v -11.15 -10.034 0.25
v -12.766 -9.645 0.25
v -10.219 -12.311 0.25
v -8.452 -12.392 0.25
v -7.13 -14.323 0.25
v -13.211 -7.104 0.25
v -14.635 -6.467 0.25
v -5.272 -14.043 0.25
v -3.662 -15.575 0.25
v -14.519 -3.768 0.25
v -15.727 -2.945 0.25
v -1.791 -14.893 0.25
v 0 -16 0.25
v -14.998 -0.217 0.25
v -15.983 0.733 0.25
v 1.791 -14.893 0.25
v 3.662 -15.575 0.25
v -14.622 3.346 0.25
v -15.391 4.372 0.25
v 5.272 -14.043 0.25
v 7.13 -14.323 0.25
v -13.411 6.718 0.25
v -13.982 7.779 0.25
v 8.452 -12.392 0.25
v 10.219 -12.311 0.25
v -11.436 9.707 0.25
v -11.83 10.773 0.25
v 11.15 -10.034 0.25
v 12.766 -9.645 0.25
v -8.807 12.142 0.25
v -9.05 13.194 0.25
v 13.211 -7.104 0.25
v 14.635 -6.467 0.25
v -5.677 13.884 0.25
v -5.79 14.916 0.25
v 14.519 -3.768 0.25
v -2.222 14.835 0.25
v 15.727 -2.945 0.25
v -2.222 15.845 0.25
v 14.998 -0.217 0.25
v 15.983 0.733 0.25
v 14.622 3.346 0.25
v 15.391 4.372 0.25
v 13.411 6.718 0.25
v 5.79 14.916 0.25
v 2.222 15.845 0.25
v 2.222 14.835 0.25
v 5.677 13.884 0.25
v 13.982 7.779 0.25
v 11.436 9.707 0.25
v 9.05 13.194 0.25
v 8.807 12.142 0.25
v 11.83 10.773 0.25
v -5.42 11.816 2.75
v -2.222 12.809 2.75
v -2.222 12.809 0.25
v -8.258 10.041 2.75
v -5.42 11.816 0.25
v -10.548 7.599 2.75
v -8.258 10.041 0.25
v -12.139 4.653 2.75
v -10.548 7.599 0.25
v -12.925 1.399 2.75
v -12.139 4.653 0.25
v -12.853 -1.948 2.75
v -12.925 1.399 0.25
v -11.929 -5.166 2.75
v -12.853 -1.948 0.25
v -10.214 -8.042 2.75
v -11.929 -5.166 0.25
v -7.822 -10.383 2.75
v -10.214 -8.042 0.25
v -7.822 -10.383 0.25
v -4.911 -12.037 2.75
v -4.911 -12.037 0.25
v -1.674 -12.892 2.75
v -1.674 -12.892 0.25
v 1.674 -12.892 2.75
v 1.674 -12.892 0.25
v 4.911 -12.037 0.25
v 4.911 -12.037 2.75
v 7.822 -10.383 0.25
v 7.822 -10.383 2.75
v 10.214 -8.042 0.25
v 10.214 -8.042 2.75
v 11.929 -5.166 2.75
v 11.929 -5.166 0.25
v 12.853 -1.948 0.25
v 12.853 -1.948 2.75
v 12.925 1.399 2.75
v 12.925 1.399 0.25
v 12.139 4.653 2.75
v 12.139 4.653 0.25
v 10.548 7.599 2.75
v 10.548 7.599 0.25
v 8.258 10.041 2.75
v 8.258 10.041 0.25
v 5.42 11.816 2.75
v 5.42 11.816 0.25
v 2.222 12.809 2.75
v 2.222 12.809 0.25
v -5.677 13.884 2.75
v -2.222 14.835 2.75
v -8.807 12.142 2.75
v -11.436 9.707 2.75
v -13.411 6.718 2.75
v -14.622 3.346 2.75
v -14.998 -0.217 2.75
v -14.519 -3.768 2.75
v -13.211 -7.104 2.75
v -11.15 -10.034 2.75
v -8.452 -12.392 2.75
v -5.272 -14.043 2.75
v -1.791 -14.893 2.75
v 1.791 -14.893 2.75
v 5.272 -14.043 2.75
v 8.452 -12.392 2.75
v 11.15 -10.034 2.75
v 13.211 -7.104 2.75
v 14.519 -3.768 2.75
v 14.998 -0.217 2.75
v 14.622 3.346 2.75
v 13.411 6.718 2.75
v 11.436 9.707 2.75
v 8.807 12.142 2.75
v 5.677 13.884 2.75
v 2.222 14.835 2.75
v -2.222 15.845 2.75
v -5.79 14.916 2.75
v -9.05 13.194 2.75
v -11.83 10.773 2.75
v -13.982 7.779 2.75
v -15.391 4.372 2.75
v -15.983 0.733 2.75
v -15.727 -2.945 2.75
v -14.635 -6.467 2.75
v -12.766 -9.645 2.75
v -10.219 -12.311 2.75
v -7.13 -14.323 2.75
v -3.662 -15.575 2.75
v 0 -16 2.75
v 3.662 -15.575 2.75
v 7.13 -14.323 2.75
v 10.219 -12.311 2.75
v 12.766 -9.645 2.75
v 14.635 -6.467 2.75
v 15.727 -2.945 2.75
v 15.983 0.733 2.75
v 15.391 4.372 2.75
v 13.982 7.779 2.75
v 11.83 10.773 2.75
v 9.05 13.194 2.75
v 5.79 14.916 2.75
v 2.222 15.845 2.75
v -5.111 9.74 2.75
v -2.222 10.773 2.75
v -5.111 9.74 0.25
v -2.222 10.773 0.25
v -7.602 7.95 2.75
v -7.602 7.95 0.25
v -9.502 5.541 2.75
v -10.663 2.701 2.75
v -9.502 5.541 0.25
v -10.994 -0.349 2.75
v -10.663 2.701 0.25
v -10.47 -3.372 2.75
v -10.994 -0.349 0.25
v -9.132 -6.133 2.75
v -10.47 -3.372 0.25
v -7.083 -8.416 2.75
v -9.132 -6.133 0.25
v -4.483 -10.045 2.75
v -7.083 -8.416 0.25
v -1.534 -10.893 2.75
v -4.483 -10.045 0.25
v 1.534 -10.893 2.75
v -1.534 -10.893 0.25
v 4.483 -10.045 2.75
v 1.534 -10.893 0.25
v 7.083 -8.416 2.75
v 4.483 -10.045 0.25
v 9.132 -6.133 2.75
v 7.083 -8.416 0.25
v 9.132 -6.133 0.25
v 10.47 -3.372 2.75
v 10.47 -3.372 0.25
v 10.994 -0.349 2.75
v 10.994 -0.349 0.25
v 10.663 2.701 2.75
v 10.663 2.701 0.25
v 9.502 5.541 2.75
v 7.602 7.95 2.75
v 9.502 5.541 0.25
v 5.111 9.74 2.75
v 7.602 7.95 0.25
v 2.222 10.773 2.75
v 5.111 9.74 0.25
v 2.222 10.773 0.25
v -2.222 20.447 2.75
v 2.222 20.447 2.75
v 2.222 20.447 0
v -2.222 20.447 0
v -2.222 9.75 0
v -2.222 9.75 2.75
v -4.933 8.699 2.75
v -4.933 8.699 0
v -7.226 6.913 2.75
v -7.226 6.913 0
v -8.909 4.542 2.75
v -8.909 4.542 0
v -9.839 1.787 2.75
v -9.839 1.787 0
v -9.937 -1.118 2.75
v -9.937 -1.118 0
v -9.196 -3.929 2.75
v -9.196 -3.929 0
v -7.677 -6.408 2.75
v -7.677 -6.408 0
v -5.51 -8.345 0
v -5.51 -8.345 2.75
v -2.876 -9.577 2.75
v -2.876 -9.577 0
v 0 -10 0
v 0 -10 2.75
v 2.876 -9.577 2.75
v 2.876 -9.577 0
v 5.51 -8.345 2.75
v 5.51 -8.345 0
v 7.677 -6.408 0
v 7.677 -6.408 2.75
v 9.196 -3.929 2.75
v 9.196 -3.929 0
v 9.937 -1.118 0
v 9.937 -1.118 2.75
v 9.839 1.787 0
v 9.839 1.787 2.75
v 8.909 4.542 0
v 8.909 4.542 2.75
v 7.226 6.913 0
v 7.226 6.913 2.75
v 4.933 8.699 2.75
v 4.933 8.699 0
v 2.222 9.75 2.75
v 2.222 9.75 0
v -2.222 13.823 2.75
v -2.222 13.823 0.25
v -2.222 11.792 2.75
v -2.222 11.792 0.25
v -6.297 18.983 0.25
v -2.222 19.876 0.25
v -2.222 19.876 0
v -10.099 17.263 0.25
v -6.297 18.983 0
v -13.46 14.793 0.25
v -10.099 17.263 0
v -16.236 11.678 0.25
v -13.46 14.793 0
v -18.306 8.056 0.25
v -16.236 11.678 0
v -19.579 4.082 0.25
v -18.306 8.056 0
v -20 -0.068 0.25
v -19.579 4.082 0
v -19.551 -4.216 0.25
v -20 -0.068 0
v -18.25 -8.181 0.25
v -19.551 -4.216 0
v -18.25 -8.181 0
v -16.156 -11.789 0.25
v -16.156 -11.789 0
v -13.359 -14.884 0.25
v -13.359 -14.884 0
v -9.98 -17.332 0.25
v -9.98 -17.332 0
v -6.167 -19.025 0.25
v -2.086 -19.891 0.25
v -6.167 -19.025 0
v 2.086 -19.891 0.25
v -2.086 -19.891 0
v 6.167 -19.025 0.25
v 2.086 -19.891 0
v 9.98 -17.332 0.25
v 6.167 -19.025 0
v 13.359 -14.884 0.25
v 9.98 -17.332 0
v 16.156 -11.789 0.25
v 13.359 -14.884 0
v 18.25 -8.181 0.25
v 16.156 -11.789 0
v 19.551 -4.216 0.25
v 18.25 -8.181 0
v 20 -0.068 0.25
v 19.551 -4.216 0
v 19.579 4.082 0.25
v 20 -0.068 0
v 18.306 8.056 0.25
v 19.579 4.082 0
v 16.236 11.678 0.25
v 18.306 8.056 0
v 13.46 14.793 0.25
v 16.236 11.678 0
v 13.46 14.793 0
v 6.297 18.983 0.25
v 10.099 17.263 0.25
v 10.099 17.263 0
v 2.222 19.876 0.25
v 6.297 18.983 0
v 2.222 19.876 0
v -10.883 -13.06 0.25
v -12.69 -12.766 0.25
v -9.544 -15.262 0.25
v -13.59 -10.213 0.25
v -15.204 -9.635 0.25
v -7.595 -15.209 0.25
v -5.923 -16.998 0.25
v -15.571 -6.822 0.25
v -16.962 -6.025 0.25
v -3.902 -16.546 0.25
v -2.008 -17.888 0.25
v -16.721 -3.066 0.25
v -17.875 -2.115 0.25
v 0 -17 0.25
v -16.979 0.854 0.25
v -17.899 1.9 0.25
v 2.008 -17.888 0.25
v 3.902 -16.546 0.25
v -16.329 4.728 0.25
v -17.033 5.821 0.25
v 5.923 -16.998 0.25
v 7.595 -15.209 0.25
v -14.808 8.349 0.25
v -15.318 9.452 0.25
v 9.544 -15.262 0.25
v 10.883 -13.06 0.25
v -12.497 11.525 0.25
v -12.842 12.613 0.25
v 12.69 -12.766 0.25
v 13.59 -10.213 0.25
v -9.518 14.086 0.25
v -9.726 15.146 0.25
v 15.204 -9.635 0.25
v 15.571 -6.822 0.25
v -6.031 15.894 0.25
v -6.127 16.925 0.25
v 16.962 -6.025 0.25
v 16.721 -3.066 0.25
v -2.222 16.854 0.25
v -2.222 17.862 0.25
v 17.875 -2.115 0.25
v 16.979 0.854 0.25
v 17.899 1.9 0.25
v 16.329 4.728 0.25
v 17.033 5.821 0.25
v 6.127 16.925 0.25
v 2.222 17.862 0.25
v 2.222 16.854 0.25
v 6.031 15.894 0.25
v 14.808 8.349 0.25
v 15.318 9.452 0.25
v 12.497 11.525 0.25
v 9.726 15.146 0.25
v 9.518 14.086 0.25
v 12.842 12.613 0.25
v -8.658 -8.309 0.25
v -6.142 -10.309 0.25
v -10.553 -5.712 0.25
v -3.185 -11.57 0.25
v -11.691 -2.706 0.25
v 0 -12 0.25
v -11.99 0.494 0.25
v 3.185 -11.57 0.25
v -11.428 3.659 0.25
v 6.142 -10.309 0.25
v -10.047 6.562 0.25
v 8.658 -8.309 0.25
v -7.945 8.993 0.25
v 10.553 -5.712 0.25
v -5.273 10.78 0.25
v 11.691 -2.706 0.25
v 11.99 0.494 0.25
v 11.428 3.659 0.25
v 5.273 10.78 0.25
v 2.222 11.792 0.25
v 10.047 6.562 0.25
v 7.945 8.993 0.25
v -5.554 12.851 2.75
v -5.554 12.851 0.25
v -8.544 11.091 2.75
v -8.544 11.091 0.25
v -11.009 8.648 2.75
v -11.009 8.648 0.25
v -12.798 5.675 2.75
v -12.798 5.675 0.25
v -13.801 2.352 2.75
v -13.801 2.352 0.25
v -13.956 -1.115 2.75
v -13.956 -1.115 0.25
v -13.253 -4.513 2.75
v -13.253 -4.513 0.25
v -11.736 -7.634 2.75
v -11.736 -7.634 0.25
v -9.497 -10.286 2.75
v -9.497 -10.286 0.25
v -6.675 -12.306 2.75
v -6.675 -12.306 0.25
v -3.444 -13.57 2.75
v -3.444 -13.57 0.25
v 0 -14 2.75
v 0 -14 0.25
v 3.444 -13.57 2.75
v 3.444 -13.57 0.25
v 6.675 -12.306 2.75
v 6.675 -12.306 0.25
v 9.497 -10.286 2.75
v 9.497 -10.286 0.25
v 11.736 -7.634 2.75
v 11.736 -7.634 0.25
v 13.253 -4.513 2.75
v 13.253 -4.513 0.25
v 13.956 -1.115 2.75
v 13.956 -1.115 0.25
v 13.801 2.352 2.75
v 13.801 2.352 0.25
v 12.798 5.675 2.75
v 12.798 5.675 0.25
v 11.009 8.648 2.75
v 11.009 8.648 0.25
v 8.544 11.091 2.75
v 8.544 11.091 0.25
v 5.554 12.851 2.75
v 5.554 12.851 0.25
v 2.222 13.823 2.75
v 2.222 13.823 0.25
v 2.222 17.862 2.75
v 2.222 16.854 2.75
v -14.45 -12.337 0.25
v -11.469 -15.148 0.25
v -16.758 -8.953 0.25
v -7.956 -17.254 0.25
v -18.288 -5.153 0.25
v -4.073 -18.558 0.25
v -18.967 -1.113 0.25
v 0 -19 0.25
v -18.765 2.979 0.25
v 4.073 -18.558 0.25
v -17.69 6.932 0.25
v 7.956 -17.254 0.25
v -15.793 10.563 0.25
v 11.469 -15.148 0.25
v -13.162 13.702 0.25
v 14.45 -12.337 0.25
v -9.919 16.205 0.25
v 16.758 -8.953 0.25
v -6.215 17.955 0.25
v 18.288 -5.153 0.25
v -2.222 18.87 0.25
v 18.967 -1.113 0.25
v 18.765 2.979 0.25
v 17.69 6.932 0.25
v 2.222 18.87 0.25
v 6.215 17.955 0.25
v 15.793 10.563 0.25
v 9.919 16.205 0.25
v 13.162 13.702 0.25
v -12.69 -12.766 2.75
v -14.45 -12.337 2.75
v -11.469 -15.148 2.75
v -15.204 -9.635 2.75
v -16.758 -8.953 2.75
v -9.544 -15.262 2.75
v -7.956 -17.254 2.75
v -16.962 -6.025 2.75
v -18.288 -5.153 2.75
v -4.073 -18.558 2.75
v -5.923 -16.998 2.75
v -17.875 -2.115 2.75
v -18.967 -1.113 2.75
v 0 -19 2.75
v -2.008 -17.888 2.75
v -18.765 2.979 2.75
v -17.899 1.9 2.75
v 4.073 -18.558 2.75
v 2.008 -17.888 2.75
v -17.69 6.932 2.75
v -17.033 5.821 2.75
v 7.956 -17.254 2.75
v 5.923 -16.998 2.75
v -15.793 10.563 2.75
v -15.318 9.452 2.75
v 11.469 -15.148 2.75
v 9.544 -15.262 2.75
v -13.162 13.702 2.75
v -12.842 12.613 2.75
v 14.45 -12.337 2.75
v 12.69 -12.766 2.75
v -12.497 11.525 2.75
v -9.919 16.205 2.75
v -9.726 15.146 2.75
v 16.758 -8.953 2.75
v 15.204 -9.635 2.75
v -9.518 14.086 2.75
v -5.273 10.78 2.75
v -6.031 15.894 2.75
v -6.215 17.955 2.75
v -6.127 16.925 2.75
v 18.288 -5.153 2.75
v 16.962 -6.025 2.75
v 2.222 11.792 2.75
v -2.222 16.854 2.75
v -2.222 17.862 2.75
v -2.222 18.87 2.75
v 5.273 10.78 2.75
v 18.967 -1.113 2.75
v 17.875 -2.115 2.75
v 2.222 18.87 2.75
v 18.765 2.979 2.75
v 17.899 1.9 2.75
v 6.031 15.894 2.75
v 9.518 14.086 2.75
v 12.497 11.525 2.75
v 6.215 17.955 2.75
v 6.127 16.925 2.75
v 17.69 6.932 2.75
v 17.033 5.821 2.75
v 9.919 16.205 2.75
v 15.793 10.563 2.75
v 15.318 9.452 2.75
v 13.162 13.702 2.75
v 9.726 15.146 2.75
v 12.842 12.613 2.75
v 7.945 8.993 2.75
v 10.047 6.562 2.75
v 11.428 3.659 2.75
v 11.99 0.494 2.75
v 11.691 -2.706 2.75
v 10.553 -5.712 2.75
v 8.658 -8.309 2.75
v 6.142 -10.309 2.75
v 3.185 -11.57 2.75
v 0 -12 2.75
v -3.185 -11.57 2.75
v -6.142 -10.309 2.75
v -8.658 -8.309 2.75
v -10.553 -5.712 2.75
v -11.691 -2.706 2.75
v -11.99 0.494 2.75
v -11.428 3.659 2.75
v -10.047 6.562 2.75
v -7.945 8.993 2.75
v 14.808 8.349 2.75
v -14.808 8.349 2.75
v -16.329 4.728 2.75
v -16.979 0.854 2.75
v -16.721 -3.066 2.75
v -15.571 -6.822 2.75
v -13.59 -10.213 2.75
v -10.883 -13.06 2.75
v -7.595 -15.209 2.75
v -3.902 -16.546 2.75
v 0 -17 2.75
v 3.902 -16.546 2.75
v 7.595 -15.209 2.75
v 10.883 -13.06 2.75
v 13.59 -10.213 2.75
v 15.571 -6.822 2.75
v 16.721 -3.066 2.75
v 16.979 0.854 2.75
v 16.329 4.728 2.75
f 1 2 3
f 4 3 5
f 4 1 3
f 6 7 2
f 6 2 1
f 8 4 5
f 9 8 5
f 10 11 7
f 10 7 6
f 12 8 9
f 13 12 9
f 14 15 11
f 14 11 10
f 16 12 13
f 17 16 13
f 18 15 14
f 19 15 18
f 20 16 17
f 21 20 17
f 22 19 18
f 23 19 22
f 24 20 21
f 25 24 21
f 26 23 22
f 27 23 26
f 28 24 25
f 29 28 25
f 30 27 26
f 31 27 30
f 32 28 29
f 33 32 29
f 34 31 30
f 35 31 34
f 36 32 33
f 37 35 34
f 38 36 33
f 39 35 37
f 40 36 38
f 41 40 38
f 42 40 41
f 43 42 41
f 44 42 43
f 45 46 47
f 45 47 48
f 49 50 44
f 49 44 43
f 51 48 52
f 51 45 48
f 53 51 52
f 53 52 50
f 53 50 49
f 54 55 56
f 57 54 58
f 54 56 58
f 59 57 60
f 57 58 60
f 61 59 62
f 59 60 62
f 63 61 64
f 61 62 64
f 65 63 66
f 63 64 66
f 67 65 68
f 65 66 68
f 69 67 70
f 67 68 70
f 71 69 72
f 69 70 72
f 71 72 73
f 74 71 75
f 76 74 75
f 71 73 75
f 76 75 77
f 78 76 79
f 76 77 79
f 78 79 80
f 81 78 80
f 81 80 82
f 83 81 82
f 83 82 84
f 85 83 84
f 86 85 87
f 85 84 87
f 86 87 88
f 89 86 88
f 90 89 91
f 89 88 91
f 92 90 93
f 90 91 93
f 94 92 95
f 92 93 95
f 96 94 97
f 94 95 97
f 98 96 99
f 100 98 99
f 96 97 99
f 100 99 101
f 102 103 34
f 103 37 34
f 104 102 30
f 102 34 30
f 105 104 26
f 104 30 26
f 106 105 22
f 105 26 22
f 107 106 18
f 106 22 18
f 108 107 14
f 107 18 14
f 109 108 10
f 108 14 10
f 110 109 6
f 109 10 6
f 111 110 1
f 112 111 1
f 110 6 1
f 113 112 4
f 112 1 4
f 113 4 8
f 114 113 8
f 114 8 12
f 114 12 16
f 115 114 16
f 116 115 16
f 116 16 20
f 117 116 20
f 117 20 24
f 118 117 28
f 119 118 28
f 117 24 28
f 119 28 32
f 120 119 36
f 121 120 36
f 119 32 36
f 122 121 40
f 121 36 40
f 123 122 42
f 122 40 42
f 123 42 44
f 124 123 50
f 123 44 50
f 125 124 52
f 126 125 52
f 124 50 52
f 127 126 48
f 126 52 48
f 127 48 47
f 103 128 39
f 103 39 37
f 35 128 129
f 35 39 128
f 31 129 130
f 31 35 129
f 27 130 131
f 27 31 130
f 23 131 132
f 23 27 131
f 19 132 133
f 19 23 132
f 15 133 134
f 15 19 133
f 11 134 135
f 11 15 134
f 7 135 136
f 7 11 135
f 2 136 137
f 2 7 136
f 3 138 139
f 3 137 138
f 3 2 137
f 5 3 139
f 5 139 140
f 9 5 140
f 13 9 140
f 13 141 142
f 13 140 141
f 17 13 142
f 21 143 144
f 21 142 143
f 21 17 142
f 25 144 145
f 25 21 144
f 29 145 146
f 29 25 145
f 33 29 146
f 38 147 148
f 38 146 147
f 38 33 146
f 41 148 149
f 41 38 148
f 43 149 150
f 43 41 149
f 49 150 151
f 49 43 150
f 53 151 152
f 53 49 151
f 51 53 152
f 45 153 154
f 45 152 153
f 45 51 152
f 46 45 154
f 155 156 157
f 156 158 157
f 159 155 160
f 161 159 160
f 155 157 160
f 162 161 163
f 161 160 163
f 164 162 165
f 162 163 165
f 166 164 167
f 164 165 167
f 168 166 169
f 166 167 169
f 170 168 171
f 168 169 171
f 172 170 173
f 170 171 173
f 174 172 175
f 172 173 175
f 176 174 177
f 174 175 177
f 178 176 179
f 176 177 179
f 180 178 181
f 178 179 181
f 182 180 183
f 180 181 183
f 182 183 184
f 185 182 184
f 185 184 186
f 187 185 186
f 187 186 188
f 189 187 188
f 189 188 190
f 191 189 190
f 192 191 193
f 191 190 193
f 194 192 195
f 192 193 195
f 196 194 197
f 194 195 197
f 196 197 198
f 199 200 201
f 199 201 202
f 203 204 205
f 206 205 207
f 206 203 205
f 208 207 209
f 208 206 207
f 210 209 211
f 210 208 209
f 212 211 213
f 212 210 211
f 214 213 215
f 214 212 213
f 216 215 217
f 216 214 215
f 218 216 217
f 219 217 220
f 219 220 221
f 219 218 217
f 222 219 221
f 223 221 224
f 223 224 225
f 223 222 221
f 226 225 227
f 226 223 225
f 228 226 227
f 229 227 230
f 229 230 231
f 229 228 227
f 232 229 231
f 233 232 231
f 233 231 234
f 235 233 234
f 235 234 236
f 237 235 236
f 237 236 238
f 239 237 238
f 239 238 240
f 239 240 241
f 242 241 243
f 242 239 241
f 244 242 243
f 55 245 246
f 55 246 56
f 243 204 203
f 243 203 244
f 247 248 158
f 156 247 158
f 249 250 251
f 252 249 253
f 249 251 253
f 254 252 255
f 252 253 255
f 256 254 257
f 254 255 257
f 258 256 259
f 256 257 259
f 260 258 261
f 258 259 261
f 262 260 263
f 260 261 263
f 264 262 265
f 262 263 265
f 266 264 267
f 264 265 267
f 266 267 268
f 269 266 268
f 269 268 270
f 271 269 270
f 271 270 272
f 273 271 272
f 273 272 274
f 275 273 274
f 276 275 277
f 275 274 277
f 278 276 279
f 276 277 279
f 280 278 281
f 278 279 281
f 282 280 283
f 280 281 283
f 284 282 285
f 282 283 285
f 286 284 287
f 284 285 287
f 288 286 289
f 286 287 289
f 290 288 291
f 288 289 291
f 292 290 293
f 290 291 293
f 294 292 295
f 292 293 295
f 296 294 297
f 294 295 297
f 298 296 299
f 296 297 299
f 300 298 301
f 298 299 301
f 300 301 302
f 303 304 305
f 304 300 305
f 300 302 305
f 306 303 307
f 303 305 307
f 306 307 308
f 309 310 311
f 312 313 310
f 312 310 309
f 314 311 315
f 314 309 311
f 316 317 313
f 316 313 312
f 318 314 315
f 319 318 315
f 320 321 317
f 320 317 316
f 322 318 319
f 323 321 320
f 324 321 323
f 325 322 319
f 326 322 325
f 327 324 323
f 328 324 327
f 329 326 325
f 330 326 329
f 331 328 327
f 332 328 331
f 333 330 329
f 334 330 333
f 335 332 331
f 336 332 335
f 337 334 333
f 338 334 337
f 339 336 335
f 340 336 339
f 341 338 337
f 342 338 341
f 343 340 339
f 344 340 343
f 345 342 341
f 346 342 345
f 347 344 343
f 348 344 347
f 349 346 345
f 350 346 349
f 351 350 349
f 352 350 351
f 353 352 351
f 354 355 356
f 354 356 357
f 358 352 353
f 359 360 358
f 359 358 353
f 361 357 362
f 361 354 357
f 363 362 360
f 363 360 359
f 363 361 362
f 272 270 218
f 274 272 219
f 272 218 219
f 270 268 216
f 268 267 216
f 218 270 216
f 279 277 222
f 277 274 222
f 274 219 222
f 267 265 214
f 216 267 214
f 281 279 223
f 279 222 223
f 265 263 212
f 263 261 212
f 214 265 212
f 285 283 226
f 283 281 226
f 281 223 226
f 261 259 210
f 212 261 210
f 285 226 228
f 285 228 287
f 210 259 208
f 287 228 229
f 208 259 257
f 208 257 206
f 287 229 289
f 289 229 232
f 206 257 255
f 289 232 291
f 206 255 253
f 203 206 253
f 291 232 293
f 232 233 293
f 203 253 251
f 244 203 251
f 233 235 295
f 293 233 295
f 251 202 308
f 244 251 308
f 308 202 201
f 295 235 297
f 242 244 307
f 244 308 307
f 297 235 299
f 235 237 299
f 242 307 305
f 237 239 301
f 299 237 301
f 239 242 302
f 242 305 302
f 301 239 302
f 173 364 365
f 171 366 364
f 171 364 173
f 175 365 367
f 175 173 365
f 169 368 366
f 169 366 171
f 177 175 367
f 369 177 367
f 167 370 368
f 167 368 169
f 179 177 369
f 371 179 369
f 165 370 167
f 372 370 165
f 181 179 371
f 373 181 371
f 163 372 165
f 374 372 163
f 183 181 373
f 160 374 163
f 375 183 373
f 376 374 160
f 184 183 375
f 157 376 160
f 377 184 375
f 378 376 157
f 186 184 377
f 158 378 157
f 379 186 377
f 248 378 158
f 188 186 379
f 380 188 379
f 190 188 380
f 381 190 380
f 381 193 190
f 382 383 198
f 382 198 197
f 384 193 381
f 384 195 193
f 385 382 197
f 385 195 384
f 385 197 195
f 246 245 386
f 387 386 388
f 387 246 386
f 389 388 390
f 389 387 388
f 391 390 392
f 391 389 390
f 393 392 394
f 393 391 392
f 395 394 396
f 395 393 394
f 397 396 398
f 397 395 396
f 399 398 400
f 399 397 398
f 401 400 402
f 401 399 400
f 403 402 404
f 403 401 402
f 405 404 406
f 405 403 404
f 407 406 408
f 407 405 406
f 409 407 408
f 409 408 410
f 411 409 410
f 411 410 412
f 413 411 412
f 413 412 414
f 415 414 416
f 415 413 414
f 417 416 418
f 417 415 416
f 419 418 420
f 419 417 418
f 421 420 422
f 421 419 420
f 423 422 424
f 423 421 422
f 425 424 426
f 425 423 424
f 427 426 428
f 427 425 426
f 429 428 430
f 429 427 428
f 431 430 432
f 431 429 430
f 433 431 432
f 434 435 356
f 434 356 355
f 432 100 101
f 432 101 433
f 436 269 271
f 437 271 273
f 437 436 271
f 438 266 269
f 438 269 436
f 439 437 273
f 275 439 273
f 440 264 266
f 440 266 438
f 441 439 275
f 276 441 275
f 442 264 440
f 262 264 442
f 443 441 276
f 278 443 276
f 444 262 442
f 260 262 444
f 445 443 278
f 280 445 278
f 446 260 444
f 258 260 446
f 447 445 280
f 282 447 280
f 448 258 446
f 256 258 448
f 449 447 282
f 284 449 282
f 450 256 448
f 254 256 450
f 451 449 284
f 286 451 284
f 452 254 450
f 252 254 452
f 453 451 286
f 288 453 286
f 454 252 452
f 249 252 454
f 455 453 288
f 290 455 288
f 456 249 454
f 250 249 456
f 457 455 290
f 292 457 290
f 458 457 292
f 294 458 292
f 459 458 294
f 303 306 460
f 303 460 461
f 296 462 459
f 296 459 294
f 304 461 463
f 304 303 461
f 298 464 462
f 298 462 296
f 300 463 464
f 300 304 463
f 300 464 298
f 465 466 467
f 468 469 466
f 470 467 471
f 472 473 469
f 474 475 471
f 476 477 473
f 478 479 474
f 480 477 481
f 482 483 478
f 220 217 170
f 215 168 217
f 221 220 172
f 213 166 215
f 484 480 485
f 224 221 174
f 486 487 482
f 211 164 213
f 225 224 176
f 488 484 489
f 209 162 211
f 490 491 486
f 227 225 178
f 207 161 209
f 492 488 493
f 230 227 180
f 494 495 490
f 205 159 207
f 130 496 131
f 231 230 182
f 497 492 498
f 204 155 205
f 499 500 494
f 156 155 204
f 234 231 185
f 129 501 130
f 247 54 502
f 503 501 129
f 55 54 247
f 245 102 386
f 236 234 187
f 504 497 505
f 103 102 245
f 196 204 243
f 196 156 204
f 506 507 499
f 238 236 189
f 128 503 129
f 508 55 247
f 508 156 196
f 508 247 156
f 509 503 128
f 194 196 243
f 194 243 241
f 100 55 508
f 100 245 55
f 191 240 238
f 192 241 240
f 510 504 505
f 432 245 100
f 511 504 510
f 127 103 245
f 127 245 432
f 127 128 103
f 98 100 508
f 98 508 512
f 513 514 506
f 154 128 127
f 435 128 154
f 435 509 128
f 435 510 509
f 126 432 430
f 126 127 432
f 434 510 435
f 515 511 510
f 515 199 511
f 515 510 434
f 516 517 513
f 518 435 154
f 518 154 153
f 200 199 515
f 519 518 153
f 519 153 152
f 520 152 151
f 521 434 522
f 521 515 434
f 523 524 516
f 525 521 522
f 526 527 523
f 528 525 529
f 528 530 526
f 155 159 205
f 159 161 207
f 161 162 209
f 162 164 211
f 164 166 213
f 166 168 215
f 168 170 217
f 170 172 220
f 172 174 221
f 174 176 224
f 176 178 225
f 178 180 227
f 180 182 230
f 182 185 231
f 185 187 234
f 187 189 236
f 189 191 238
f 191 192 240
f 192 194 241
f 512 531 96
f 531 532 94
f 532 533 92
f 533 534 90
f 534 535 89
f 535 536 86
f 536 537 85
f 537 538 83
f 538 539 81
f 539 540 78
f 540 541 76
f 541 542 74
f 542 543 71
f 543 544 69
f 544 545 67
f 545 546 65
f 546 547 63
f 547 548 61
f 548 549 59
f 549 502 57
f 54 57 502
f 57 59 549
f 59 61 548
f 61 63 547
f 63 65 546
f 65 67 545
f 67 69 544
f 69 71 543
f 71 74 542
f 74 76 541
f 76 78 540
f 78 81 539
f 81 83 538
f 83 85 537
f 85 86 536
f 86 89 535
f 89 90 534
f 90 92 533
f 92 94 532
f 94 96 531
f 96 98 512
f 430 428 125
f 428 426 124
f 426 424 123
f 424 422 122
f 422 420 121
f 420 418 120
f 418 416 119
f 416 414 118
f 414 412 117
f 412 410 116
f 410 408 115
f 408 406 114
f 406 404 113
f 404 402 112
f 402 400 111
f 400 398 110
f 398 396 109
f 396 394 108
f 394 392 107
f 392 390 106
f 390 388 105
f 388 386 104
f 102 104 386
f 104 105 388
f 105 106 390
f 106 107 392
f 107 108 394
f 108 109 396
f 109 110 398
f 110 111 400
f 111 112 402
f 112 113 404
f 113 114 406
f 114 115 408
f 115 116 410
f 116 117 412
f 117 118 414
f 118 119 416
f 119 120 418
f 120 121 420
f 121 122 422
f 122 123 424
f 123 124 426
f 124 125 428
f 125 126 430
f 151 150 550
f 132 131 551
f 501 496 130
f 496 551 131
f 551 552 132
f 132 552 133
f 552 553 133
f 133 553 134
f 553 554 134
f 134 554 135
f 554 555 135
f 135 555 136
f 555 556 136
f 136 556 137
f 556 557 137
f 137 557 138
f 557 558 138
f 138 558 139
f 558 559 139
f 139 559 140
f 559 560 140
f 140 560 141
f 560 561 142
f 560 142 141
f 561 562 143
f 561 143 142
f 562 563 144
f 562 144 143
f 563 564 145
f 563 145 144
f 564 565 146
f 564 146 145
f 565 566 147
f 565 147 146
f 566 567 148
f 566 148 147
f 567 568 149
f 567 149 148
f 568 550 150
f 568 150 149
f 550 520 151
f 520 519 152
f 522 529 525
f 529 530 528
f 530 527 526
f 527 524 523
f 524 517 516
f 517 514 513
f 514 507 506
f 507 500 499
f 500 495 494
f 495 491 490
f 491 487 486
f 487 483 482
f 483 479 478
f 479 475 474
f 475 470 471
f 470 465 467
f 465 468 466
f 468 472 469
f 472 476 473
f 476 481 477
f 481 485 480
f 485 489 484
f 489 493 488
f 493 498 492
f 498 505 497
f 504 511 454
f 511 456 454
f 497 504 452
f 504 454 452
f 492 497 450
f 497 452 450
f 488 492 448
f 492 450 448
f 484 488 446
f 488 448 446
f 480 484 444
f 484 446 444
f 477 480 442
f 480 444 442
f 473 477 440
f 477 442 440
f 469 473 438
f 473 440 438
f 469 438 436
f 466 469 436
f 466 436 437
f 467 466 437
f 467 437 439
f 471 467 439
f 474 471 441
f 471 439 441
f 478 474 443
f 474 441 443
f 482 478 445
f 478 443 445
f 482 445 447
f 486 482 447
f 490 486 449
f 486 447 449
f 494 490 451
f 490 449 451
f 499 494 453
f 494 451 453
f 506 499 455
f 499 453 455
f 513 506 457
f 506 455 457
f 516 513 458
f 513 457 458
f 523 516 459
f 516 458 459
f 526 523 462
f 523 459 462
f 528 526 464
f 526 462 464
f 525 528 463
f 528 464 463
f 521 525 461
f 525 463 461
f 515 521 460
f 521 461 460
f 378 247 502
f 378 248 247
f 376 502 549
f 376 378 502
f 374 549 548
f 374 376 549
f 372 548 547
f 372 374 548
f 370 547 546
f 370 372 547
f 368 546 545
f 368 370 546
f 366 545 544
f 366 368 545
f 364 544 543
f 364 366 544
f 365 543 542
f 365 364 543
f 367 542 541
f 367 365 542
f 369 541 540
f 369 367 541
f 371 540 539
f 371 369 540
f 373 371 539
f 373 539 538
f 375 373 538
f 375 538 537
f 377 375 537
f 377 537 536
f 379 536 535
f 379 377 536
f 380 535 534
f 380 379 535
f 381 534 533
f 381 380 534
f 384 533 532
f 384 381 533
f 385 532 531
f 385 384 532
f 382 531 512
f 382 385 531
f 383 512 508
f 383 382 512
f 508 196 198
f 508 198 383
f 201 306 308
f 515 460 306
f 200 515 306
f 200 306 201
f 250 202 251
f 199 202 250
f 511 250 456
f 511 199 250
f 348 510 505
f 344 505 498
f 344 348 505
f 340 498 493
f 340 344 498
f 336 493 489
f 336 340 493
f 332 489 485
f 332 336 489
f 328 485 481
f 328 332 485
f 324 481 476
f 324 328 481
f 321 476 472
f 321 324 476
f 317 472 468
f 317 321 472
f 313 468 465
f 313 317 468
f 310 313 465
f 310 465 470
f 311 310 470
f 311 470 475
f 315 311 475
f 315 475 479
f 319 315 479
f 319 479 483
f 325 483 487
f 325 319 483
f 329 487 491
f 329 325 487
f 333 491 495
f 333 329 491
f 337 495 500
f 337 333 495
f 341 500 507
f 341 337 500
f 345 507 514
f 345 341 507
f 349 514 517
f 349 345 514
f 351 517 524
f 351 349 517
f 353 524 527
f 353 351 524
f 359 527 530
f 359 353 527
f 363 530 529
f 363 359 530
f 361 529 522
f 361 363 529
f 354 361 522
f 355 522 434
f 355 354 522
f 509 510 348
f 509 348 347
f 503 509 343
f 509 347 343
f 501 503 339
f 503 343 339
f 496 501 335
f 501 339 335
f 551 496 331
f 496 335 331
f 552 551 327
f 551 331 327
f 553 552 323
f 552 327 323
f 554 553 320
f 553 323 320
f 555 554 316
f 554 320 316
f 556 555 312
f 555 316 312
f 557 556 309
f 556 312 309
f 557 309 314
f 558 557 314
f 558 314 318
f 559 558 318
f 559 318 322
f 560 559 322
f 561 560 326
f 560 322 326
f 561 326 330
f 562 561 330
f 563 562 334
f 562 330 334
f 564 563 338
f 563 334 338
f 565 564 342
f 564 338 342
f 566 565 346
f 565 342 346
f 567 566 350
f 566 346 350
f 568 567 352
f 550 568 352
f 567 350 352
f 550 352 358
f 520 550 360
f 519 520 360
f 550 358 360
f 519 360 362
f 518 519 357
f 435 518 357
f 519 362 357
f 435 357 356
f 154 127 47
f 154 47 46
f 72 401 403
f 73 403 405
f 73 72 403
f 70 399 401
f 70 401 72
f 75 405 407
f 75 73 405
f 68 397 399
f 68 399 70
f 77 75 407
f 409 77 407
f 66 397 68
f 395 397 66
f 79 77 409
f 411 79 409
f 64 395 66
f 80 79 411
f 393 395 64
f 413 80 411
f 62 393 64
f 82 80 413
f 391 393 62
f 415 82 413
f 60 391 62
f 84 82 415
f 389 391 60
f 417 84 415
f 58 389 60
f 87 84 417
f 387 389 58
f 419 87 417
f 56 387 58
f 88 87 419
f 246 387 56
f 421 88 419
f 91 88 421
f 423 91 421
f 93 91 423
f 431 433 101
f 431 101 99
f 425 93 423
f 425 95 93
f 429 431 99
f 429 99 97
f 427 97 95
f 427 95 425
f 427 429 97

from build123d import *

# Parameters (mm, degrees)
CROQUIS1_R              = 20
CROQUIS1_R_2            = 10
SALIENTE_EXTRUIR1_DEPTH = 2.75
CORTAR_EXTRUIR1_START   = -2.5
CROQUIS2_R              = 20
CROQUIS2_R_2            = 19
CROQUIS2_R_3            = 18
CROQUIS2_R_4            = 17
CROQUIS2_R_5            = 16
CROQUIS2_R_6            = 15
CROQUIS2_R_7            = 14
CROQUIS2_R_8            = 13
CROQUIS2_R_9            = 12
CROQUIS2_R_10           = 11
CORTAR_EXTRUIR1_DEPTH   = 2.5
SALIENTE_EXTRUIR2_DEPTH = 2.75


with BuildPart() as part:
    # Croquis1 → Saliente-Extruir1 (new body)
    with BuildSketch(Plane.XY):
        Circle(CROQUIS1_R)
        Circle(CROQUIS1_R_2, mode=Mode.SUBTRACT)
    extrude(amount=SALIENTE_EXTRUIR1_DEPTH)

    # Croquis2 → Cortar-Extruir1 (cut)
    # profile 1 of 5: a face of its own
    with BuildSketch(Plane.XY.offset(2.75).offset(CORTAR_EXTRUIR1_START)):
        Circle(CROQUIS2_R)
        Circle(CROQUIS2_R_2, mode=Mode.SUBTRACT)
    # profile 2 of 5: a face of its own
    with BuildSketch(Plane.XY.offset(2.75).offset(CORTAR_EXTRUIR1_START)):
        Circle(CROQUIS2_R_3)
        Circle(CROQUIS2_R_4, mode=Mode.SUBTRACT)
    # profile 3 of 5: a face of its own
    with BuildSketch(Plane.XY.offset(2.75).offset(CORTAR_EXTRUIR1_START)):
        Circle(CROQUIS2_R_5)
        Circle(CROQUIS2_R_6, mode=Mode.SUBTRACT)
    # profile 4 of 5: a face of its own
    with BuildSketch(Plane.XY.offset(2.75).offset(CORTAR_EXTRUIR1_START)):
        Circle(CROQUIS2_R_7)
        Circle(CROQUIS2_R_8, mode=Mode.SUBTRACT)
    # profile 5 of 5: a face of its own
    with BuildSketch(Plane.XY.offset(2.75).offset(CORTAR_EXTRUIR1_START)):
        Circle(CROQUIS2_R_9)
        Circle(CROQUIS2_R_10, mode=Mode.SUBTRACT)
    extrude(amount=CORTAR_EXTRUIR1_DEPTH, mode=Mode.SUBTRACT)

    # Croquis3 → Saliente-Extruir2 (add)
    with BuildSketch(Plane.XY.offset(2.75)):
        Polygon((-2.222048604, 9.75), (0, 9.75), (2.222048604, 9.75), (2.222048604, 20.446693488), (-2.222048604, 20.446693488), align=None)
    extrude(amount=-SALIENTE_EXTRUIR2_DEPTH)


solid = part.part
